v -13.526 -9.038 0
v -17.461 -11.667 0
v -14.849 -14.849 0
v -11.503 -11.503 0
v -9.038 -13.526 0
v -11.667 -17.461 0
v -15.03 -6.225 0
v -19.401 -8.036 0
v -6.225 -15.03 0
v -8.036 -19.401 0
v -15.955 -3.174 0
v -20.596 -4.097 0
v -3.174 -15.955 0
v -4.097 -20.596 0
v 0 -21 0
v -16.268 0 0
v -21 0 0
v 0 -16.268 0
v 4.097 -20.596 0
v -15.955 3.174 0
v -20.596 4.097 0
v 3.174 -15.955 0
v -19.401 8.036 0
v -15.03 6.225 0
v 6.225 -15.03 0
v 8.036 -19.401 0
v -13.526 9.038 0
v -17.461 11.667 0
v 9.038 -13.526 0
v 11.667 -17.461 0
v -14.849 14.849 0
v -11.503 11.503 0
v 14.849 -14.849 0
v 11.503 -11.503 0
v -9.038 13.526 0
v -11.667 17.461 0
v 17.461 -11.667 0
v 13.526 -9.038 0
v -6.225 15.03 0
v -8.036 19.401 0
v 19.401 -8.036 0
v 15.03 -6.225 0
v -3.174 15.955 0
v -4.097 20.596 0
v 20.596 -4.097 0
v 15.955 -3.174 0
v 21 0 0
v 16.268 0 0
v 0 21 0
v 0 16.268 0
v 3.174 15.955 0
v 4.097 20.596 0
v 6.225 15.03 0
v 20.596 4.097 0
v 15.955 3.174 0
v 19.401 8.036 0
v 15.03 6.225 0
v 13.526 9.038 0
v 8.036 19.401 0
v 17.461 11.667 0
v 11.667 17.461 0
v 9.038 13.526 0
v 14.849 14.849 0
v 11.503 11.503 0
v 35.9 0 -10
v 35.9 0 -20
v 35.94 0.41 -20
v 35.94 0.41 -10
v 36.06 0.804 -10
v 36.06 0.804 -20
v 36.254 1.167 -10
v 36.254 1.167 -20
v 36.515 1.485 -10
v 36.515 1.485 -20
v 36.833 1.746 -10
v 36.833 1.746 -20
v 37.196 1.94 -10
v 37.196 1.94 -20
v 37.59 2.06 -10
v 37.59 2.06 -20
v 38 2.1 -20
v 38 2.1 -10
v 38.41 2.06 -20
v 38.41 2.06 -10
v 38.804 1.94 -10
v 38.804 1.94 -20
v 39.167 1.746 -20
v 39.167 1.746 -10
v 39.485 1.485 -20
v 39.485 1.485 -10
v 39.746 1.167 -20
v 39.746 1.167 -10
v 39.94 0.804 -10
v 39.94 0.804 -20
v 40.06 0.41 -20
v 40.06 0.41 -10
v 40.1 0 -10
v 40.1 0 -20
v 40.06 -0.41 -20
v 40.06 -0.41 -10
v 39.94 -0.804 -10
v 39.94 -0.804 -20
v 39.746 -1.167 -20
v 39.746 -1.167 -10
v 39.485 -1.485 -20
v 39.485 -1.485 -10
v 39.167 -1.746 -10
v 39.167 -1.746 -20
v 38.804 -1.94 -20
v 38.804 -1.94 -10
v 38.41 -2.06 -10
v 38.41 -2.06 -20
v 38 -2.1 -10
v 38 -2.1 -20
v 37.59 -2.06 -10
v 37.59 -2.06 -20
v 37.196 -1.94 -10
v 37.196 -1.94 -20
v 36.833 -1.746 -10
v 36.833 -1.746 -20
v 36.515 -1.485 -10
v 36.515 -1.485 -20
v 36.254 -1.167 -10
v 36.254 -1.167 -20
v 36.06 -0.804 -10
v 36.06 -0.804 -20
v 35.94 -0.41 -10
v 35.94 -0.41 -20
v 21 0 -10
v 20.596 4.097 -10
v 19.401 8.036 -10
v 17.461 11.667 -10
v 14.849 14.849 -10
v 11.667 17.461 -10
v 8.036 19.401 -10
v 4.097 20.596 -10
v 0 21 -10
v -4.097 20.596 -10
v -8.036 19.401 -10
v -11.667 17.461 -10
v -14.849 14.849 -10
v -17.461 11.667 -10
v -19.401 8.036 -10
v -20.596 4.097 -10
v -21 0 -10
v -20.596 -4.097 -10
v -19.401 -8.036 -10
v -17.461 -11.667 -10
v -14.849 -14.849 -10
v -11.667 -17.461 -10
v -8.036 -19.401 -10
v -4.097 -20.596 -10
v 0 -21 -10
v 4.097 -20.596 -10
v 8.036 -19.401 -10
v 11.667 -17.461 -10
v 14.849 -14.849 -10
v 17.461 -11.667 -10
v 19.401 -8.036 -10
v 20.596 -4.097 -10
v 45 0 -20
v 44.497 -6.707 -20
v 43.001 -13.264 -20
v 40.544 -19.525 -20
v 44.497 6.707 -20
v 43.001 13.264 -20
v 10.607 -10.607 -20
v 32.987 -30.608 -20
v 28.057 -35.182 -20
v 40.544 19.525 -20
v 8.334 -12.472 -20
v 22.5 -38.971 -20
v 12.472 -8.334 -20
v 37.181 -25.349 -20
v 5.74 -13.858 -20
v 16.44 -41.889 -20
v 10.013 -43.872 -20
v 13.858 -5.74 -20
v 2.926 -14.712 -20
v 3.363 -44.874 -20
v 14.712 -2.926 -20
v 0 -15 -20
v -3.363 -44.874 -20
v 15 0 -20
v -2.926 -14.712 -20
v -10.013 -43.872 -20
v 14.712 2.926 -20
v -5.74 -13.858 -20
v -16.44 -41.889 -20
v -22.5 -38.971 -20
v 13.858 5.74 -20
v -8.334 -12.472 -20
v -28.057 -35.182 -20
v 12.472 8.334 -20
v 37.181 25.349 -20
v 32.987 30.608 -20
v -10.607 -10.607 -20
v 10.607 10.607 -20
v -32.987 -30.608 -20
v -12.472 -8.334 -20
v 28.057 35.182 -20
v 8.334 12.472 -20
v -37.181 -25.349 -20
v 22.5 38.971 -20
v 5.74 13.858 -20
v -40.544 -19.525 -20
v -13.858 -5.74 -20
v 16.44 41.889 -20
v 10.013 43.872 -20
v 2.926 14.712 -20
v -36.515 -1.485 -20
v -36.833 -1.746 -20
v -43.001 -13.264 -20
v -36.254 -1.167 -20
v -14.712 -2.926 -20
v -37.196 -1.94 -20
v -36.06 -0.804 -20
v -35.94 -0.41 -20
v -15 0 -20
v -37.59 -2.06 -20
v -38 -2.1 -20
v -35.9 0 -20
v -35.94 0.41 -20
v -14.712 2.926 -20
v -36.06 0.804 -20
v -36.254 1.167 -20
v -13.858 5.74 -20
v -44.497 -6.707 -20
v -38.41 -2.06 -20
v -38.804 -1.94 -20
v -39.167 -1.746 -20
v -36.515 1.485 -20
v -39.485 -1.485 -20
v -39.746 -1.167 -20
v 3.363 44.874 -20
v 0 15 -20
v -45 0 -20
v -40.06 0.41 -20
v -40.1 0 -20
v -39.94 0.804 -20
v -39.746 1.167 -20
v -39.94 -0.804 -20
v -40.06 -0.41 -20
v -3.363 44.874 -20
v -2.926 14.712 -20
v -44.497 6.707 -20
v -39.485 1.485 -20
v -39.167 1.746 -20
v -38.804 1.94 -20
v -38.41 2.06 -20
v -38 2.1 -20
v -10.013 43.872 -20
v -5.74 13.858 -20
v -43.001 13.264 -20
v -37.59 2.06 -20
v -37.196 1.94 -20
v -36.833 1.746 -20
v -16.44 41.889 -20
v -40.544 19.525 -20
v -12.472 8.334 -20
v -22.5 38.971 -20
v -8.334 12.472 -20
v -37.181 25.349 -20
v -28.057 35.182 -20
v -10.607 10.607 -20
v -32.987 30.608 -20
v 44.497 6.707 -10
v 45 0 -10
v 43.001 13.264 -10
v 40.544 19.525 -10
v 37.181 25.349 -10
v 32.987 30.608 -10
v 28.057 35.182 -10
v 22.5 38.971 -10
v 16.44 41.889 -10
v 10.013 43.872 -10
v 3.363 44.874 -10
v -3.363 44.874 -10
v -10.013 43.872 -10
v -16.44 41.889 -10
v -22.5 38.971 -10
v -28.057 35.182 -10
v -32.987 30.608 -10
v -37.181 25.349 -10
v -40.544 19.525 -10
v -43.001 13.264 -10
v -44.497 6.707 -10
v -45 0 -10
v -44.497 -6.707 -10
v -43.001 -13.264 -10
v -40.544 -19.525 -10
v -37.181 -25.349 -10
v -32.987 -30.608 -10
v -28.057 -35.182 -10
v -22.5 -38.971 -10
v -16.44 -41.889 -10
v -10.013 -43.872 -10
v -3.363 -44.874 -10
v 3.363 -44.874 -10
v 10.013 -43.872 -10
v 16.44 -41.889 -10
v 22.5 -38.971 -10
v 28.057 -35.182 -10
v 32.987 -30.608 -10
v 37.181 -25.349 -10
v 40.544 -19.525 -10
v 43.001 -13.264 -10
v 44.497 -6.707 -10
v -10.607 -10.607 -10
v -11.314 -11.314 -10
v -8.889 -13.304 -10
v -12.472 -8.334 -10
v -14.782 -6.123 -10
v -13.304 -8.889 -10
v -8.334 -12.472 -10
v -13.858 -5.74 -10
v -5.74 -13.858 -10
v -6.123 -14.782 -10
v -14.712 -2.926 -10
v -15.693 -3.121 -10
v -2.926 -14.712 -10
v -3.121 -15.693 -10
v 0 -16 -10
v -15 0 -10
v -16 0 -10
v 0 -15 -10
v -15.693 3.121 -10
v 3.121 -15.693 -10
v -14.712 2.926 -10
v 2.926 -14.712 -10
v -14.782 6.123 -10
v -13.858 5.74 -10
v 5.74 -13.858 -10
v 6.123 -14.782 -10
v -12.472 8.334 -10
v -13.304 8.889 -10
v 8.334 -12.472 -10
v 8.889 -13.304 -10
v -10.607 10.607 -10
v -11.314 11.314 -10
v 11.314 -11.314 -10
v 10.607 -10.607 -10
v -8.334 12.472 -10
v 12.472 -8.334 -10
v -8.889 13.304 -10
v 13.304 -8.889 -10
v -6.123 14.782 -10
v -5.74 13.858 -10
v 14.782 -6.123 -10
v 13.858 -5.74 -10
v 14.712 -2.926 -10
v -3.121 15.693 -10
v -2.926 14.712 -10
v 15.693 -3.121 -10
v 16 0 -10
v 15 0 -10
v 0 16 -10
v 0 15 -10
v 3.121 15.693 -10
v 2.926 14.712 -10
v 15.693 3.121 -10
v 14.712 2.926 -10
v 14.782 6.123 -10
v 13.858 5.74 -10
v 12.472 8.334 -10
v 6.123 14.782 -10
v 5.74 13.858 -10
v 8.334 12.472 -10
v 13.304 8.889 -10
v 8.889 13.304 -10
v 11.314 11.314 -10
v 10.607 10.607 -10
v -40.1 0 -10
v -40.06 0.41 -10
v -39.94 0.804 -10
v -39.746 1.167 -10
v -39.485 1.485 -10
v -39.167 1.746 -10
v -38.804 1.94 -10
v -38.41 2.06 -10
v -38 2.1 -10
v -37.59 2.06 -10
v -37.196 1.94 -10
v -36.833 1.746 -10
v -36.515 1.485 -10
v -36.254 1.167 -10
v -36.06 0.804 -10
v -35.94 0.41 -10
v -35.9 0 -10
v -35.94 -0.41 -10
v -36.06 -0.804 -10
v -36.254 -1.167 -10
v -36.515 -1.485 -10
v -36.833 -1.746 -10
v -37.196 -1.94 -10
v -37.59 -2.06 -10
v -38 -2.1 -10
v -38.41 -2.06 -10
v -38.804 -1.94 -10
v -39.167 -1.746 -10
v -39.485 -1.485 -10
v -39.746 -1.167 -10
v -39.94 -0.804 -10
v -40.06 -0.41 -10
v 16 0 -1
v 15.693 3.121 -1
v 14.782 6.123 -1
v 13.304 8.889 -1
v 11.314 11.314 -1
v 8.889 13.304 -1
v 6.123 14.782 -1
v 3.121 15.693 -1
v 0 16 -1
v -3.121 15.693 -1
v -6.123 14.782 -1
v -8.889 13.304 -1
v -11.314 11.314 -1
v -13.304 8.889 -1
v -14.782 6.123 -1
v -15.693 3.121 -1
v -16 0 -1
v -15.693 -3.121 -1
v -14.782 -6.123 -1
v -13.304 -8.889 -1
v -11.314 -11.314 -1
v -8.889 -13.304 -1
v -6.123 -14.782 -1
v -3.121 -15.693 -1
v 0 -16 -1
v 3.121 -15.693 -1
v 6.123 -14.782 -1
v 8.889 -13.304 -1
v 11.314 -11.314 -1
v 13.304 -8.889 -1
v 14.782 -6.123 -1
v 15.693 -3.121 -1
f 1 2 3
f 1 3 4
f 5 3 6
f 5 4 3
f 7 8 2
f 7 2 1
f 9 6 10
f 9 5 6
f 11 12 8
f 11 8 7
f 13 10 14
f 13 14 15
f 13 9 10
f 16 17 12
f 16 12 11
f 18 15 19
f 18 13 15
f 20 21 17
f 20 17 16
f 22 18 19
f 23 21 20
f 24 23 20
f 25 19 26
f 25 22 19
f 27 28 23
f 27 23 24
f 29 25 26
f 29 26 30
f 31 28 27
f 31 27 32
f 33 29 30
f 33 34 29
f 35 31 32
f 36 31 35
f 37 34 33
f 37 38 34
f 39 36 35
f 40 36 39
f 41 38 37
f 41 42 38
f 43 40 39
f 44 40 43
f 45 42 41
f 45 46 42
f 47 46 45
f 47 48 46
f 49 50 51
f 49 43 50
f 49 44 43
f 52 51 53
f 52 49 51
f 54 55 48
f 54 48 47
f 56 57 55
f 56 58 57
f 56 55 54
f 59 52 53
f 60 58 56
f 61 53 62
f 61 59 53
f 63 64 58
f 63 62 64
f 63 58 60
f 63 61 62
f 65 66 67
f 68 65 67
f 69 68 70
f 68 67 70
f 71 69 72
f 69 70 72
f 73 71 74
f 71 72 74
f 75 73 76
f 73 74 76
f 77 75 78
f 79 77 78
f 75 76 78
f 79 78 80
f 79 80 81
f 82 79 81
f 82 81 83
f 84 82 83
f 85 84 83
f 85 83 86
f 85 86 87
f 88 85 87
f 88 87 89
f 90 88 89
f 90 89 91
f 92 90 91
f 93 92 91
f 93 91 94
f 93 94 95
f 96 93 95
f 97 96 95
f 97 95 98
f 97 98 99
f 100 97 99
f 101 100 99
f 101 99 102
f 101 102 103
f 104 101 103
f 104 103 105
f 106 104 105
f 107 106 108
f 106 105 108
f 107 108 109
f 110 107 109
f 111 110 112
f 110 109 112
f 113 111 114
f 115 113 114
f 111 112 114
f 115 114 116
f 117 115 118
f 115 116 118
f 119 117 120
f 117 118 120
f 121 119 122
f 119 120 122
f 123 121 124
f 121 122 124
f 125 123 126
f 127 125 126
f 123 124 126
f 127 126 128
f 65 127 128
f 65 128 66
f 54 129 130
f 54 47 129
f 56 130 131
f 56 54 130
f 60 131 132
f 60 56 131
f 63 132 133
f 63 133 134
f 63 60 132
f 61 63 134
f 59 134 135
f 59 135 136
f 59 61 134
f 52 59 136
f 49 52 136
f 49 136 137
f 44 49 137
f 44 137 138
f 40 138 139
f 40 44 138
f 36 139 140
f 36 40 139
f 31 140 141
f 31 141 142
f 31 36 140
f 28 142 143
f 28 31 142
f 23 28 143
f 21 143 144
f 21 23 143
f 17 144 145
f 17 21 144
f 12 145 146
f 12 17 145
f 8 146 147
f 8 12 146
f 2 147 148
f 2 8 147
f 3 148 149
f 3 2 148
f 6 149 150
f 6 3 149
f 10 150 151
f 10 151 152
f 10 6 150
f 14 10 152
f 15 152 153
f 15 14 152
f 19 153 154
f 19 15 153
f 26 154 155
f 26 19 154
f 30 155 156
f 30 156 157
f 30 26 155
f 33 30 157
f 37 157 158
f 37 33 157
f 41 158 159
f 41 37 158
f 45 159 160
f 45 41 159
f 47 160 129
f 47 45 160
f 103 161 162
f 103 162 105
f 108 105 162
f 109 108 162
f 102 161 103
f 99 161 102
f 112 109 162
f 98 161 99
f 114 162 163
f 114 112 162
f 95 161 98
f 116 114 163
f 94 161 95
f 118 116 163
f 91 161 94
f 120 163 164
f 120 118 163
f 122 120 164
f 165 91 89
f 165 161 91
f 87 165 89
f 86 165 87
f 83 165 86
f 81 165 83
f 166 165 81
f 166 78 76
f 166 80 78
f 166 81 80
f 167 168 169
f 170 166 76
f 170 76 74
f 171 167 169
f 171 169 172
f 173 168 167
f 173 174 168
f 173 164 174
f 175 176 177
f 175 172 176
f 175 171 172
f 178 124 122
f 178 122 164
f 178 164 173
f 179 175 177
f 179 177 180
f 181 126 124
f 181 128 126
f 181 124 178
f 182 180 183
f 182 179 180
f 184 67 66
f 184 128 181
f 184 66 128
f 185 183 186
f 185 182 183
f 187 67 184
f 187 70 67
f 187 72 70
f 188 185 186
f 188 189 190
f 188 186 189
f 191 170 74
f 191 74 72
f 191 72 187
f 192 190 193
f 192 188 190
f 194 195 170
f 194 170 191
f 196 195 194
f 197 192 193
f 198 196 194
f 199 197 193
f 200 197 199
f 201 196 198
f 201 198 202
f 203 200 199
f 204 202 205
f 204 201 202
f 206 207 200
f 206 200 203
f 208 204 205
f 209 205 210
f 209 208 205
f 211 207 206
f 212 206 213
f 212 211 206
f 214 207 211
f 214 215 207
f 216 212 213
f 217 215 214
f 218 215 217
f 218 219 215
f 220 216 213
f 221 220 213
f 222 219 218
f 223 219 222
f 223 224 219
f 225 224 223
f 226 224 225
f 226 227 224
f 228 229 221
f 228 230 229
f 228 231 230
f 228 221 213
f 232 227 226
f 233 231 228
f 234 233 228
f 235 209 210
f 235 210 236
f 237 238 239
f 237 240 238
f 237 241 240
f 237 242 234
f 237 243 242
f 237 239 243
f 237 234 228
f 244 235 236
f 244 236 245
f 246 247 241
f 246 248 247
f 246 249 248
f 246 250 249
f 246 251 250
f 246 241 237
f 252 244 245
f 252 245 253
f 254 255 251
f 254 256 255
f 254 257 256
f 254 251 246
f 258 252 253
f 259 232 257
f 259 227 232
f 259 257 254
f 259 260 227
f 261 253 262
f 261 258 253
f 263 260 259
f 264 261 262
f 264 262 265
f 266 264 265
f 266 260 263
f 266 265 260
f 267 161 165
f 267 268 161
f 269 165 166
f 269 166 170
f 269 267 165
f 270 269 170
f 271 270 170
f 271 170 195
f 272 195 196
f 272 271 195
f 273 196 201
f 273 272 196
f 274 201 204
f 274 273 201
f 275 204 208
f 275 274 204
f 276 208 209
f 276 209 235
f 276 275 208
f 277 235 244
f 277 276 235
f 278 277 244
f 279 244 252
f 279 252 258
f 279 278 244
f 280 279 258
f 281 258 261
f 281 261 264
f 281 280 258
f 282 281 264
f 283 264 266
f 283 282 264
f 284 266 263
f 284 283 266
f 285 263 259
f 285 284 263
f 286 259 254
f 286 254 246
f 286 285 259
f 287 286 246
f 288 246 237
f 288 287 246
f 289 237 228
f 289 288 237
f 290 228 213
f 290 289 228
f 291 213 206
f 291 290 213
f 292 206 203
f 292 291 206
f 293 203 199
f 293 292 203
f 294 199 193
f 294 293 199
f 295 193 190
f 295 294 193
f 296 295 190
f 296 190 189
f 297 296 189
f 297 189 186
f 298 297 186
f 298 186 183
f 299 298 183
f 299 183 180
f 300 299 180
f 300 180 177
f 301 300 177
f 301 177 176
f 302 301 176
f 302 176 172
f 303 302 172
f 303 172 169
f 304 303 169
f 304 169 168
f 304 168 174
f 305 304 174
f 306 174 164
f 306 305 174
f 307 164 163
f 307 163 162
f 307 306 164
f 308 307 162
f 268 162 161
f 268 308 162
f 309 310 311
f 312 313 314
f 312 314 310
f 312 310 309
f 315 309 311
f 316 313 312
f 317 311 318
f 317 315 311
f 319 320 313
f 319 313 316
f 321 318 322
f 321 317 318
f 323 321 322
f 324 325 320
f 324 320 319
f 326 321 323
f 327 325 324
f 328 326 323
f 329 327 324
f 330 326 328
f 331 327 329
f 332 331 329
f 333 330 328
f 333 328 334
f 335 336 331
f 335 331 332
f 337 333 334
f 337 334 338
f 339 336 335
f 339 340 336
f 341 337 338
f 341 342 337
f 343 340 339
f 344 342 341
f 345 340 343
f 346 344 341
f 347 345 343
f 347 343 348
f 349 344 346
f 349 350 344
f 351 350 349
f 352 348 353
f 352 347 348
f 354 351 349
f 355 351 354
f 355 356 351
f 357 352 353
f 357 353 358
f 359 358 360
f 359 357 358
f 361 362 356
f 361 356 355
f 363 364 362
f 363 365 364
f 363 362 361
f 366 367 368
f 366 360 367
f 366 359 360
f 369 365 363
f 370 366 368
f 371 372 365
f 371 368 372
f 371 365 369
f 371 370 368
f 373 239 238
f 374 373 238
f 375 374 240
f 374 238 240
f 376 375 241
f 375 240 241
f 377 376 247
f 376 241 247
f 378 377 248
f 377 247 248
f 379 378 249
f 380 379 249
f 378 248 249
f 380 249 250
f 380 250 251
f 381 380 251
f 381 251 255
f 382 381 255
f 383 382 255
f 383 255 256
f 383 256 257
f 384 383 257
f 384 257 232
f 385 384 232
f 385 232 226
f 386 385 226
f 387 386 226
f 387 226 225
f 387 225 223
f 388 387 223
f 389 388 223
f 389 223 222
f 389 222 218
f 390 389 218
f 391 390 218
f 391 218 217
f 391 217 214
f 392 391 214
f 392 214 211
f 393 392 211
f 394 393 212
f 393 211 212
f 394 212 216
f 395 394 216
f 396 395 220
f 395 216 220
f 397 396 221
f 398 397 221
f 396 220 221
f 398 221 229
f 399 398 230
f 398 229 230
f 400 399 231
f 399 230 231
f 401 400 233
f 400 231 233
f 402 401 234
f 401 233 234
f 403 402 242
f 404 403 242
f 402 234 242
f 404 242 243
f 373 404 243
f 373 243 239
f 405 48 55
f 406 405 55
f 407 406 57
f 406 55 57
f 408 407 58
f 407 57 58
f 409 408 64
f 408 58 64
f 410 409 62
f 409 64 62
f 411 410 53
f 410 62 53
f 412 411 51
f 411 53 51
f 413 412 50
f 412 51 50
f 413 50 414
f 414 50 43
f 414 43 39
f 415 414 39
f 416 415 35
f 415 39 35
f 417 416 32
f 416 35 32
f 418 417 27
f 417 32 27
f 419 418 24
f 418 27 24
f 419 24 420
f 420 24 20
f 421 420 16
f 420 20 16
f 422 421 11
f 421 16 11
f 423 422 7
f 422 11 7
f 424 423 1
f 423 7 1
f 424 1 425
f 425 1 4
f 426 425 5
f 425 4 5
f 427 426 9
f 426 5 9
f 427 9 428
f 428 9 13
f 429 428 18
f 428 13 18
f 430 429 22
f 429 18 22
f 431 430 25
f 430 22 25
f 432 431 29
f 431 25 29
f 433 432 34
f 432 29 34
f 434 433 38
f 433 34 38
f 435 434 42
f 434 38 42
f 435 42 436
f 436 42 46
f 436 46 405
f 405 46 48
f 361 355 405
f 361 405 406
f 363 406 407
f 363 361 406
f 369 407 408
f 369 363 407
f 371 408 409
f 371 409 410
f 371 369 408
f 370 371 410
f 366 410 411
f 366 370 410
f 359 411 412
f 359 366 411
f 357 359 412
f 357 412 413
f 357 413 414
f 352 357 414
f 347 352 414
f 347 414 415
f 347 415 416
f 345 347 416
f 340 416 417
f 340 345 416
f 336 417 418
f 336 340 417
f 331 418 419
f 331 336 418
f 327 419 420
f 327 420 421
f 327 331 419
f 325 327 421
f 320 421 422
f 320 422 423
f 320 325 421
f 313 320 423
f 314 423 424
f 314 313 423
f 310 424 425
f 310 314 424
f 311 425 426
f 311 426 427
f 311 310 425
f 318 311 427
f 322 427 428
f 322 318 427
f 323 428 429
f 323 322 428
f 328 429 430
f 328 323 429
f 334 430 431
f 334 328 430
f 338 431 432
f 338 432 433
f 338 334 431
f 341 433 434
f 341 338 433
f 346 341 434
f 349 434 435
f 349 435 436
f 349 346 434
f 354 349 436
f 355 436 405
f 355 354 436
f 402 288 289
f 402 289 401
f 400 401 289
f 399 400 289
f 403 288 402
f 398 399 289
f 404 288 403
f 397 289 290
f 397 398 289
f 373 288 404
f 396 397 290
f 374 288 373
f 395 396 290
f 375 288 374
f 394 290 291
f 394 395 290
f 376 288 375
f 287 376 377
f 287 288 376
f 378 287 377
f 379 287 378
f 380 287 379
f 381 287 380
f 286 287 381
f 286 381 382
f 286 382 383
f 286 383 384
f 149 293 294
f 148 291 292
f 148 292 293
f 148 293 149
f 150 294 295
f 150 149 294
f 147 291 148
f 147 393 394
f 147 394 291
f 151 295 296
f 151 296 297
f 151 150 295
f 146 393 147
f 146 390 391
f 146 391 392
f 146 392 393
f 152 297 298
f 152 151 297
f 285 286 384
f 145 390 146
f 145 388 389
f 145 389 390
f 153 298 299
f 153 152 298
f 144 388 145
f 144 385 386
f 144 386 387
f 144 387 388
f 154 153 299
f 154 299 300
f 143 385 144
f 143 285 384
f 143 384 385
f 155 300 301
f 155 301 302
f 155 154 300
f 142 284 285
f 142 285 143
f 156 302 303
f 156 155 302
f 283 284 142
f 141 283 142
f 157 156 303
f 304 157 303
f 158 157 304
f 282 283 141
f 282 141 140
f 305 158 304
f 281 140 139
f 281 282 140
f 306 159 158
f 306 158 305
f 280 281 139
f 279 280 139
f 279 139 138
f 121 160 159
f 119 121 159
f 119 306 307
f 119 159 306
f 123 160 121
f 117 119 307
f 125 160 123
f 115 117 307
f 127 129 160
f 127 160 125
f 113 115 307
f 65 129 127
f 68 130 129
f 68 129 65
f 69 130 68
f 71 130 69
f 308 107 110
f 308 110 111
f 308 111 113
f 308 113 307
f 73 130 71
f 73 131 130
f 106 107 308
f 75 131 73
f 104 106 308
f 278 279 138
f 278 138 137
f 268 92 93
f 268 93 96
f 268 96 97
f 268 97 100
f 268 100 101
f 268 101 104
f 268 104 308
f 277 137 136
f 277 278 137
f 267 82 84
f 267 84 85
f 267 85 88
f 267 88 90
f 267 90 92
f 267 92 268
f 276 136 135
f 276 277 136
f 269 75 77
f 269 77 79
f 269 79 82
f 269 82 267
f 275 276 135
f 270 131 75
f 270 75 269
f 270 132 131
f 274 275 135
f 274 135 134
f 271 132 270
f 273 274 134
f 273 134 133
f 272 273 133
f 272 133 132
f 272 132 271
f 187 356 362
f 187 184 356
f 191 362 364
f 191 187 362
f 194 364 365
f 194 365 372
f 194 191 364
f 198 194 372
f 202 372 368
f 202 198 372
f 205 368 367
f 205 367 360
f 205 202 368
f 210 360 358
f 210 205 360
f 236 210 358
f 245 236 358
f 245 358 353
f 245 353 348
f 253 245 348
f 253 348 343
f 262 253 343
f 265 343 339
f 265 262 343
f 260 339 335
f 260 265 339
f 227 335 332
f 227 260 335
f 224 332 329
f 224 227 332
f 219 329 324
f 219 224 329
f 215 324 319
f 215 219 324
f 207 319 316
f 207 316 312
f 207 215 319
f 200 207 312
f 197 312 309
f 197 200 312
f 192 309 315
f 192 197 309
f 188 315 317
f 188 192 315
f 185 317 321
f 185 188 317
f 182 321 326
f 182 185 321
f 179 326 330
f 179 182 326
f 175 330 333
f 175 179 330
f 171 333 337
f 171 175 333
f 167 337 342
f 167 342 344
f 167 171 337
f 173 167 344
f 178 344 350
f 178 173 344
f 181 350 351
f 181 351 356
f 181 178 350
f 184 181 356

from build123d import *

# Parameters (mm, degrees)
CHAMFER1_SIZE     = 1
CHAMFER1_SIZE2    = 0.267949192
M5_TAPPED_HOLE1_D = 4.2


with BuildPart() as part:
    # Sketch1 → Revolve1 (revolve)
    with BuildSketch(Plane(origin=(0, 0, 0), x_dir=(1, 0, 0), z_dir=(0, 1, 0))):
        Polygon((16, 0), (16, 10), (15, 10), (15, 20), (45, 20), (45, 10), (21, 10), (21, 0), align=None)
    revolve(axis=Axis((0, 0, 0), (0, 0, 1)))

    # Chamfer1
    chamfer1_edges = [part.edges().sort_by_distance(p)[0] for p in [
        (-16, 0, 0),
    ]]
    chamfer1_side = [part.faces().sort_by_distance(p)[0] for p in [
        (-16, 0, -5),
    ]]
    chamfer(chamfer1_edges, length=CHAMFER1_SIZE, length2=CHAMFER1_SIZE2, reference=chamfer1_side[0])

    # M5 Tapped Hole1 (through all)
    with Locations(Plane.XY.offset(-10)):
        with Locations((-38, 0), (38, 0)):
            Hole(M5_TAPPED_HOLE1_D / 2)


solid = part.part
